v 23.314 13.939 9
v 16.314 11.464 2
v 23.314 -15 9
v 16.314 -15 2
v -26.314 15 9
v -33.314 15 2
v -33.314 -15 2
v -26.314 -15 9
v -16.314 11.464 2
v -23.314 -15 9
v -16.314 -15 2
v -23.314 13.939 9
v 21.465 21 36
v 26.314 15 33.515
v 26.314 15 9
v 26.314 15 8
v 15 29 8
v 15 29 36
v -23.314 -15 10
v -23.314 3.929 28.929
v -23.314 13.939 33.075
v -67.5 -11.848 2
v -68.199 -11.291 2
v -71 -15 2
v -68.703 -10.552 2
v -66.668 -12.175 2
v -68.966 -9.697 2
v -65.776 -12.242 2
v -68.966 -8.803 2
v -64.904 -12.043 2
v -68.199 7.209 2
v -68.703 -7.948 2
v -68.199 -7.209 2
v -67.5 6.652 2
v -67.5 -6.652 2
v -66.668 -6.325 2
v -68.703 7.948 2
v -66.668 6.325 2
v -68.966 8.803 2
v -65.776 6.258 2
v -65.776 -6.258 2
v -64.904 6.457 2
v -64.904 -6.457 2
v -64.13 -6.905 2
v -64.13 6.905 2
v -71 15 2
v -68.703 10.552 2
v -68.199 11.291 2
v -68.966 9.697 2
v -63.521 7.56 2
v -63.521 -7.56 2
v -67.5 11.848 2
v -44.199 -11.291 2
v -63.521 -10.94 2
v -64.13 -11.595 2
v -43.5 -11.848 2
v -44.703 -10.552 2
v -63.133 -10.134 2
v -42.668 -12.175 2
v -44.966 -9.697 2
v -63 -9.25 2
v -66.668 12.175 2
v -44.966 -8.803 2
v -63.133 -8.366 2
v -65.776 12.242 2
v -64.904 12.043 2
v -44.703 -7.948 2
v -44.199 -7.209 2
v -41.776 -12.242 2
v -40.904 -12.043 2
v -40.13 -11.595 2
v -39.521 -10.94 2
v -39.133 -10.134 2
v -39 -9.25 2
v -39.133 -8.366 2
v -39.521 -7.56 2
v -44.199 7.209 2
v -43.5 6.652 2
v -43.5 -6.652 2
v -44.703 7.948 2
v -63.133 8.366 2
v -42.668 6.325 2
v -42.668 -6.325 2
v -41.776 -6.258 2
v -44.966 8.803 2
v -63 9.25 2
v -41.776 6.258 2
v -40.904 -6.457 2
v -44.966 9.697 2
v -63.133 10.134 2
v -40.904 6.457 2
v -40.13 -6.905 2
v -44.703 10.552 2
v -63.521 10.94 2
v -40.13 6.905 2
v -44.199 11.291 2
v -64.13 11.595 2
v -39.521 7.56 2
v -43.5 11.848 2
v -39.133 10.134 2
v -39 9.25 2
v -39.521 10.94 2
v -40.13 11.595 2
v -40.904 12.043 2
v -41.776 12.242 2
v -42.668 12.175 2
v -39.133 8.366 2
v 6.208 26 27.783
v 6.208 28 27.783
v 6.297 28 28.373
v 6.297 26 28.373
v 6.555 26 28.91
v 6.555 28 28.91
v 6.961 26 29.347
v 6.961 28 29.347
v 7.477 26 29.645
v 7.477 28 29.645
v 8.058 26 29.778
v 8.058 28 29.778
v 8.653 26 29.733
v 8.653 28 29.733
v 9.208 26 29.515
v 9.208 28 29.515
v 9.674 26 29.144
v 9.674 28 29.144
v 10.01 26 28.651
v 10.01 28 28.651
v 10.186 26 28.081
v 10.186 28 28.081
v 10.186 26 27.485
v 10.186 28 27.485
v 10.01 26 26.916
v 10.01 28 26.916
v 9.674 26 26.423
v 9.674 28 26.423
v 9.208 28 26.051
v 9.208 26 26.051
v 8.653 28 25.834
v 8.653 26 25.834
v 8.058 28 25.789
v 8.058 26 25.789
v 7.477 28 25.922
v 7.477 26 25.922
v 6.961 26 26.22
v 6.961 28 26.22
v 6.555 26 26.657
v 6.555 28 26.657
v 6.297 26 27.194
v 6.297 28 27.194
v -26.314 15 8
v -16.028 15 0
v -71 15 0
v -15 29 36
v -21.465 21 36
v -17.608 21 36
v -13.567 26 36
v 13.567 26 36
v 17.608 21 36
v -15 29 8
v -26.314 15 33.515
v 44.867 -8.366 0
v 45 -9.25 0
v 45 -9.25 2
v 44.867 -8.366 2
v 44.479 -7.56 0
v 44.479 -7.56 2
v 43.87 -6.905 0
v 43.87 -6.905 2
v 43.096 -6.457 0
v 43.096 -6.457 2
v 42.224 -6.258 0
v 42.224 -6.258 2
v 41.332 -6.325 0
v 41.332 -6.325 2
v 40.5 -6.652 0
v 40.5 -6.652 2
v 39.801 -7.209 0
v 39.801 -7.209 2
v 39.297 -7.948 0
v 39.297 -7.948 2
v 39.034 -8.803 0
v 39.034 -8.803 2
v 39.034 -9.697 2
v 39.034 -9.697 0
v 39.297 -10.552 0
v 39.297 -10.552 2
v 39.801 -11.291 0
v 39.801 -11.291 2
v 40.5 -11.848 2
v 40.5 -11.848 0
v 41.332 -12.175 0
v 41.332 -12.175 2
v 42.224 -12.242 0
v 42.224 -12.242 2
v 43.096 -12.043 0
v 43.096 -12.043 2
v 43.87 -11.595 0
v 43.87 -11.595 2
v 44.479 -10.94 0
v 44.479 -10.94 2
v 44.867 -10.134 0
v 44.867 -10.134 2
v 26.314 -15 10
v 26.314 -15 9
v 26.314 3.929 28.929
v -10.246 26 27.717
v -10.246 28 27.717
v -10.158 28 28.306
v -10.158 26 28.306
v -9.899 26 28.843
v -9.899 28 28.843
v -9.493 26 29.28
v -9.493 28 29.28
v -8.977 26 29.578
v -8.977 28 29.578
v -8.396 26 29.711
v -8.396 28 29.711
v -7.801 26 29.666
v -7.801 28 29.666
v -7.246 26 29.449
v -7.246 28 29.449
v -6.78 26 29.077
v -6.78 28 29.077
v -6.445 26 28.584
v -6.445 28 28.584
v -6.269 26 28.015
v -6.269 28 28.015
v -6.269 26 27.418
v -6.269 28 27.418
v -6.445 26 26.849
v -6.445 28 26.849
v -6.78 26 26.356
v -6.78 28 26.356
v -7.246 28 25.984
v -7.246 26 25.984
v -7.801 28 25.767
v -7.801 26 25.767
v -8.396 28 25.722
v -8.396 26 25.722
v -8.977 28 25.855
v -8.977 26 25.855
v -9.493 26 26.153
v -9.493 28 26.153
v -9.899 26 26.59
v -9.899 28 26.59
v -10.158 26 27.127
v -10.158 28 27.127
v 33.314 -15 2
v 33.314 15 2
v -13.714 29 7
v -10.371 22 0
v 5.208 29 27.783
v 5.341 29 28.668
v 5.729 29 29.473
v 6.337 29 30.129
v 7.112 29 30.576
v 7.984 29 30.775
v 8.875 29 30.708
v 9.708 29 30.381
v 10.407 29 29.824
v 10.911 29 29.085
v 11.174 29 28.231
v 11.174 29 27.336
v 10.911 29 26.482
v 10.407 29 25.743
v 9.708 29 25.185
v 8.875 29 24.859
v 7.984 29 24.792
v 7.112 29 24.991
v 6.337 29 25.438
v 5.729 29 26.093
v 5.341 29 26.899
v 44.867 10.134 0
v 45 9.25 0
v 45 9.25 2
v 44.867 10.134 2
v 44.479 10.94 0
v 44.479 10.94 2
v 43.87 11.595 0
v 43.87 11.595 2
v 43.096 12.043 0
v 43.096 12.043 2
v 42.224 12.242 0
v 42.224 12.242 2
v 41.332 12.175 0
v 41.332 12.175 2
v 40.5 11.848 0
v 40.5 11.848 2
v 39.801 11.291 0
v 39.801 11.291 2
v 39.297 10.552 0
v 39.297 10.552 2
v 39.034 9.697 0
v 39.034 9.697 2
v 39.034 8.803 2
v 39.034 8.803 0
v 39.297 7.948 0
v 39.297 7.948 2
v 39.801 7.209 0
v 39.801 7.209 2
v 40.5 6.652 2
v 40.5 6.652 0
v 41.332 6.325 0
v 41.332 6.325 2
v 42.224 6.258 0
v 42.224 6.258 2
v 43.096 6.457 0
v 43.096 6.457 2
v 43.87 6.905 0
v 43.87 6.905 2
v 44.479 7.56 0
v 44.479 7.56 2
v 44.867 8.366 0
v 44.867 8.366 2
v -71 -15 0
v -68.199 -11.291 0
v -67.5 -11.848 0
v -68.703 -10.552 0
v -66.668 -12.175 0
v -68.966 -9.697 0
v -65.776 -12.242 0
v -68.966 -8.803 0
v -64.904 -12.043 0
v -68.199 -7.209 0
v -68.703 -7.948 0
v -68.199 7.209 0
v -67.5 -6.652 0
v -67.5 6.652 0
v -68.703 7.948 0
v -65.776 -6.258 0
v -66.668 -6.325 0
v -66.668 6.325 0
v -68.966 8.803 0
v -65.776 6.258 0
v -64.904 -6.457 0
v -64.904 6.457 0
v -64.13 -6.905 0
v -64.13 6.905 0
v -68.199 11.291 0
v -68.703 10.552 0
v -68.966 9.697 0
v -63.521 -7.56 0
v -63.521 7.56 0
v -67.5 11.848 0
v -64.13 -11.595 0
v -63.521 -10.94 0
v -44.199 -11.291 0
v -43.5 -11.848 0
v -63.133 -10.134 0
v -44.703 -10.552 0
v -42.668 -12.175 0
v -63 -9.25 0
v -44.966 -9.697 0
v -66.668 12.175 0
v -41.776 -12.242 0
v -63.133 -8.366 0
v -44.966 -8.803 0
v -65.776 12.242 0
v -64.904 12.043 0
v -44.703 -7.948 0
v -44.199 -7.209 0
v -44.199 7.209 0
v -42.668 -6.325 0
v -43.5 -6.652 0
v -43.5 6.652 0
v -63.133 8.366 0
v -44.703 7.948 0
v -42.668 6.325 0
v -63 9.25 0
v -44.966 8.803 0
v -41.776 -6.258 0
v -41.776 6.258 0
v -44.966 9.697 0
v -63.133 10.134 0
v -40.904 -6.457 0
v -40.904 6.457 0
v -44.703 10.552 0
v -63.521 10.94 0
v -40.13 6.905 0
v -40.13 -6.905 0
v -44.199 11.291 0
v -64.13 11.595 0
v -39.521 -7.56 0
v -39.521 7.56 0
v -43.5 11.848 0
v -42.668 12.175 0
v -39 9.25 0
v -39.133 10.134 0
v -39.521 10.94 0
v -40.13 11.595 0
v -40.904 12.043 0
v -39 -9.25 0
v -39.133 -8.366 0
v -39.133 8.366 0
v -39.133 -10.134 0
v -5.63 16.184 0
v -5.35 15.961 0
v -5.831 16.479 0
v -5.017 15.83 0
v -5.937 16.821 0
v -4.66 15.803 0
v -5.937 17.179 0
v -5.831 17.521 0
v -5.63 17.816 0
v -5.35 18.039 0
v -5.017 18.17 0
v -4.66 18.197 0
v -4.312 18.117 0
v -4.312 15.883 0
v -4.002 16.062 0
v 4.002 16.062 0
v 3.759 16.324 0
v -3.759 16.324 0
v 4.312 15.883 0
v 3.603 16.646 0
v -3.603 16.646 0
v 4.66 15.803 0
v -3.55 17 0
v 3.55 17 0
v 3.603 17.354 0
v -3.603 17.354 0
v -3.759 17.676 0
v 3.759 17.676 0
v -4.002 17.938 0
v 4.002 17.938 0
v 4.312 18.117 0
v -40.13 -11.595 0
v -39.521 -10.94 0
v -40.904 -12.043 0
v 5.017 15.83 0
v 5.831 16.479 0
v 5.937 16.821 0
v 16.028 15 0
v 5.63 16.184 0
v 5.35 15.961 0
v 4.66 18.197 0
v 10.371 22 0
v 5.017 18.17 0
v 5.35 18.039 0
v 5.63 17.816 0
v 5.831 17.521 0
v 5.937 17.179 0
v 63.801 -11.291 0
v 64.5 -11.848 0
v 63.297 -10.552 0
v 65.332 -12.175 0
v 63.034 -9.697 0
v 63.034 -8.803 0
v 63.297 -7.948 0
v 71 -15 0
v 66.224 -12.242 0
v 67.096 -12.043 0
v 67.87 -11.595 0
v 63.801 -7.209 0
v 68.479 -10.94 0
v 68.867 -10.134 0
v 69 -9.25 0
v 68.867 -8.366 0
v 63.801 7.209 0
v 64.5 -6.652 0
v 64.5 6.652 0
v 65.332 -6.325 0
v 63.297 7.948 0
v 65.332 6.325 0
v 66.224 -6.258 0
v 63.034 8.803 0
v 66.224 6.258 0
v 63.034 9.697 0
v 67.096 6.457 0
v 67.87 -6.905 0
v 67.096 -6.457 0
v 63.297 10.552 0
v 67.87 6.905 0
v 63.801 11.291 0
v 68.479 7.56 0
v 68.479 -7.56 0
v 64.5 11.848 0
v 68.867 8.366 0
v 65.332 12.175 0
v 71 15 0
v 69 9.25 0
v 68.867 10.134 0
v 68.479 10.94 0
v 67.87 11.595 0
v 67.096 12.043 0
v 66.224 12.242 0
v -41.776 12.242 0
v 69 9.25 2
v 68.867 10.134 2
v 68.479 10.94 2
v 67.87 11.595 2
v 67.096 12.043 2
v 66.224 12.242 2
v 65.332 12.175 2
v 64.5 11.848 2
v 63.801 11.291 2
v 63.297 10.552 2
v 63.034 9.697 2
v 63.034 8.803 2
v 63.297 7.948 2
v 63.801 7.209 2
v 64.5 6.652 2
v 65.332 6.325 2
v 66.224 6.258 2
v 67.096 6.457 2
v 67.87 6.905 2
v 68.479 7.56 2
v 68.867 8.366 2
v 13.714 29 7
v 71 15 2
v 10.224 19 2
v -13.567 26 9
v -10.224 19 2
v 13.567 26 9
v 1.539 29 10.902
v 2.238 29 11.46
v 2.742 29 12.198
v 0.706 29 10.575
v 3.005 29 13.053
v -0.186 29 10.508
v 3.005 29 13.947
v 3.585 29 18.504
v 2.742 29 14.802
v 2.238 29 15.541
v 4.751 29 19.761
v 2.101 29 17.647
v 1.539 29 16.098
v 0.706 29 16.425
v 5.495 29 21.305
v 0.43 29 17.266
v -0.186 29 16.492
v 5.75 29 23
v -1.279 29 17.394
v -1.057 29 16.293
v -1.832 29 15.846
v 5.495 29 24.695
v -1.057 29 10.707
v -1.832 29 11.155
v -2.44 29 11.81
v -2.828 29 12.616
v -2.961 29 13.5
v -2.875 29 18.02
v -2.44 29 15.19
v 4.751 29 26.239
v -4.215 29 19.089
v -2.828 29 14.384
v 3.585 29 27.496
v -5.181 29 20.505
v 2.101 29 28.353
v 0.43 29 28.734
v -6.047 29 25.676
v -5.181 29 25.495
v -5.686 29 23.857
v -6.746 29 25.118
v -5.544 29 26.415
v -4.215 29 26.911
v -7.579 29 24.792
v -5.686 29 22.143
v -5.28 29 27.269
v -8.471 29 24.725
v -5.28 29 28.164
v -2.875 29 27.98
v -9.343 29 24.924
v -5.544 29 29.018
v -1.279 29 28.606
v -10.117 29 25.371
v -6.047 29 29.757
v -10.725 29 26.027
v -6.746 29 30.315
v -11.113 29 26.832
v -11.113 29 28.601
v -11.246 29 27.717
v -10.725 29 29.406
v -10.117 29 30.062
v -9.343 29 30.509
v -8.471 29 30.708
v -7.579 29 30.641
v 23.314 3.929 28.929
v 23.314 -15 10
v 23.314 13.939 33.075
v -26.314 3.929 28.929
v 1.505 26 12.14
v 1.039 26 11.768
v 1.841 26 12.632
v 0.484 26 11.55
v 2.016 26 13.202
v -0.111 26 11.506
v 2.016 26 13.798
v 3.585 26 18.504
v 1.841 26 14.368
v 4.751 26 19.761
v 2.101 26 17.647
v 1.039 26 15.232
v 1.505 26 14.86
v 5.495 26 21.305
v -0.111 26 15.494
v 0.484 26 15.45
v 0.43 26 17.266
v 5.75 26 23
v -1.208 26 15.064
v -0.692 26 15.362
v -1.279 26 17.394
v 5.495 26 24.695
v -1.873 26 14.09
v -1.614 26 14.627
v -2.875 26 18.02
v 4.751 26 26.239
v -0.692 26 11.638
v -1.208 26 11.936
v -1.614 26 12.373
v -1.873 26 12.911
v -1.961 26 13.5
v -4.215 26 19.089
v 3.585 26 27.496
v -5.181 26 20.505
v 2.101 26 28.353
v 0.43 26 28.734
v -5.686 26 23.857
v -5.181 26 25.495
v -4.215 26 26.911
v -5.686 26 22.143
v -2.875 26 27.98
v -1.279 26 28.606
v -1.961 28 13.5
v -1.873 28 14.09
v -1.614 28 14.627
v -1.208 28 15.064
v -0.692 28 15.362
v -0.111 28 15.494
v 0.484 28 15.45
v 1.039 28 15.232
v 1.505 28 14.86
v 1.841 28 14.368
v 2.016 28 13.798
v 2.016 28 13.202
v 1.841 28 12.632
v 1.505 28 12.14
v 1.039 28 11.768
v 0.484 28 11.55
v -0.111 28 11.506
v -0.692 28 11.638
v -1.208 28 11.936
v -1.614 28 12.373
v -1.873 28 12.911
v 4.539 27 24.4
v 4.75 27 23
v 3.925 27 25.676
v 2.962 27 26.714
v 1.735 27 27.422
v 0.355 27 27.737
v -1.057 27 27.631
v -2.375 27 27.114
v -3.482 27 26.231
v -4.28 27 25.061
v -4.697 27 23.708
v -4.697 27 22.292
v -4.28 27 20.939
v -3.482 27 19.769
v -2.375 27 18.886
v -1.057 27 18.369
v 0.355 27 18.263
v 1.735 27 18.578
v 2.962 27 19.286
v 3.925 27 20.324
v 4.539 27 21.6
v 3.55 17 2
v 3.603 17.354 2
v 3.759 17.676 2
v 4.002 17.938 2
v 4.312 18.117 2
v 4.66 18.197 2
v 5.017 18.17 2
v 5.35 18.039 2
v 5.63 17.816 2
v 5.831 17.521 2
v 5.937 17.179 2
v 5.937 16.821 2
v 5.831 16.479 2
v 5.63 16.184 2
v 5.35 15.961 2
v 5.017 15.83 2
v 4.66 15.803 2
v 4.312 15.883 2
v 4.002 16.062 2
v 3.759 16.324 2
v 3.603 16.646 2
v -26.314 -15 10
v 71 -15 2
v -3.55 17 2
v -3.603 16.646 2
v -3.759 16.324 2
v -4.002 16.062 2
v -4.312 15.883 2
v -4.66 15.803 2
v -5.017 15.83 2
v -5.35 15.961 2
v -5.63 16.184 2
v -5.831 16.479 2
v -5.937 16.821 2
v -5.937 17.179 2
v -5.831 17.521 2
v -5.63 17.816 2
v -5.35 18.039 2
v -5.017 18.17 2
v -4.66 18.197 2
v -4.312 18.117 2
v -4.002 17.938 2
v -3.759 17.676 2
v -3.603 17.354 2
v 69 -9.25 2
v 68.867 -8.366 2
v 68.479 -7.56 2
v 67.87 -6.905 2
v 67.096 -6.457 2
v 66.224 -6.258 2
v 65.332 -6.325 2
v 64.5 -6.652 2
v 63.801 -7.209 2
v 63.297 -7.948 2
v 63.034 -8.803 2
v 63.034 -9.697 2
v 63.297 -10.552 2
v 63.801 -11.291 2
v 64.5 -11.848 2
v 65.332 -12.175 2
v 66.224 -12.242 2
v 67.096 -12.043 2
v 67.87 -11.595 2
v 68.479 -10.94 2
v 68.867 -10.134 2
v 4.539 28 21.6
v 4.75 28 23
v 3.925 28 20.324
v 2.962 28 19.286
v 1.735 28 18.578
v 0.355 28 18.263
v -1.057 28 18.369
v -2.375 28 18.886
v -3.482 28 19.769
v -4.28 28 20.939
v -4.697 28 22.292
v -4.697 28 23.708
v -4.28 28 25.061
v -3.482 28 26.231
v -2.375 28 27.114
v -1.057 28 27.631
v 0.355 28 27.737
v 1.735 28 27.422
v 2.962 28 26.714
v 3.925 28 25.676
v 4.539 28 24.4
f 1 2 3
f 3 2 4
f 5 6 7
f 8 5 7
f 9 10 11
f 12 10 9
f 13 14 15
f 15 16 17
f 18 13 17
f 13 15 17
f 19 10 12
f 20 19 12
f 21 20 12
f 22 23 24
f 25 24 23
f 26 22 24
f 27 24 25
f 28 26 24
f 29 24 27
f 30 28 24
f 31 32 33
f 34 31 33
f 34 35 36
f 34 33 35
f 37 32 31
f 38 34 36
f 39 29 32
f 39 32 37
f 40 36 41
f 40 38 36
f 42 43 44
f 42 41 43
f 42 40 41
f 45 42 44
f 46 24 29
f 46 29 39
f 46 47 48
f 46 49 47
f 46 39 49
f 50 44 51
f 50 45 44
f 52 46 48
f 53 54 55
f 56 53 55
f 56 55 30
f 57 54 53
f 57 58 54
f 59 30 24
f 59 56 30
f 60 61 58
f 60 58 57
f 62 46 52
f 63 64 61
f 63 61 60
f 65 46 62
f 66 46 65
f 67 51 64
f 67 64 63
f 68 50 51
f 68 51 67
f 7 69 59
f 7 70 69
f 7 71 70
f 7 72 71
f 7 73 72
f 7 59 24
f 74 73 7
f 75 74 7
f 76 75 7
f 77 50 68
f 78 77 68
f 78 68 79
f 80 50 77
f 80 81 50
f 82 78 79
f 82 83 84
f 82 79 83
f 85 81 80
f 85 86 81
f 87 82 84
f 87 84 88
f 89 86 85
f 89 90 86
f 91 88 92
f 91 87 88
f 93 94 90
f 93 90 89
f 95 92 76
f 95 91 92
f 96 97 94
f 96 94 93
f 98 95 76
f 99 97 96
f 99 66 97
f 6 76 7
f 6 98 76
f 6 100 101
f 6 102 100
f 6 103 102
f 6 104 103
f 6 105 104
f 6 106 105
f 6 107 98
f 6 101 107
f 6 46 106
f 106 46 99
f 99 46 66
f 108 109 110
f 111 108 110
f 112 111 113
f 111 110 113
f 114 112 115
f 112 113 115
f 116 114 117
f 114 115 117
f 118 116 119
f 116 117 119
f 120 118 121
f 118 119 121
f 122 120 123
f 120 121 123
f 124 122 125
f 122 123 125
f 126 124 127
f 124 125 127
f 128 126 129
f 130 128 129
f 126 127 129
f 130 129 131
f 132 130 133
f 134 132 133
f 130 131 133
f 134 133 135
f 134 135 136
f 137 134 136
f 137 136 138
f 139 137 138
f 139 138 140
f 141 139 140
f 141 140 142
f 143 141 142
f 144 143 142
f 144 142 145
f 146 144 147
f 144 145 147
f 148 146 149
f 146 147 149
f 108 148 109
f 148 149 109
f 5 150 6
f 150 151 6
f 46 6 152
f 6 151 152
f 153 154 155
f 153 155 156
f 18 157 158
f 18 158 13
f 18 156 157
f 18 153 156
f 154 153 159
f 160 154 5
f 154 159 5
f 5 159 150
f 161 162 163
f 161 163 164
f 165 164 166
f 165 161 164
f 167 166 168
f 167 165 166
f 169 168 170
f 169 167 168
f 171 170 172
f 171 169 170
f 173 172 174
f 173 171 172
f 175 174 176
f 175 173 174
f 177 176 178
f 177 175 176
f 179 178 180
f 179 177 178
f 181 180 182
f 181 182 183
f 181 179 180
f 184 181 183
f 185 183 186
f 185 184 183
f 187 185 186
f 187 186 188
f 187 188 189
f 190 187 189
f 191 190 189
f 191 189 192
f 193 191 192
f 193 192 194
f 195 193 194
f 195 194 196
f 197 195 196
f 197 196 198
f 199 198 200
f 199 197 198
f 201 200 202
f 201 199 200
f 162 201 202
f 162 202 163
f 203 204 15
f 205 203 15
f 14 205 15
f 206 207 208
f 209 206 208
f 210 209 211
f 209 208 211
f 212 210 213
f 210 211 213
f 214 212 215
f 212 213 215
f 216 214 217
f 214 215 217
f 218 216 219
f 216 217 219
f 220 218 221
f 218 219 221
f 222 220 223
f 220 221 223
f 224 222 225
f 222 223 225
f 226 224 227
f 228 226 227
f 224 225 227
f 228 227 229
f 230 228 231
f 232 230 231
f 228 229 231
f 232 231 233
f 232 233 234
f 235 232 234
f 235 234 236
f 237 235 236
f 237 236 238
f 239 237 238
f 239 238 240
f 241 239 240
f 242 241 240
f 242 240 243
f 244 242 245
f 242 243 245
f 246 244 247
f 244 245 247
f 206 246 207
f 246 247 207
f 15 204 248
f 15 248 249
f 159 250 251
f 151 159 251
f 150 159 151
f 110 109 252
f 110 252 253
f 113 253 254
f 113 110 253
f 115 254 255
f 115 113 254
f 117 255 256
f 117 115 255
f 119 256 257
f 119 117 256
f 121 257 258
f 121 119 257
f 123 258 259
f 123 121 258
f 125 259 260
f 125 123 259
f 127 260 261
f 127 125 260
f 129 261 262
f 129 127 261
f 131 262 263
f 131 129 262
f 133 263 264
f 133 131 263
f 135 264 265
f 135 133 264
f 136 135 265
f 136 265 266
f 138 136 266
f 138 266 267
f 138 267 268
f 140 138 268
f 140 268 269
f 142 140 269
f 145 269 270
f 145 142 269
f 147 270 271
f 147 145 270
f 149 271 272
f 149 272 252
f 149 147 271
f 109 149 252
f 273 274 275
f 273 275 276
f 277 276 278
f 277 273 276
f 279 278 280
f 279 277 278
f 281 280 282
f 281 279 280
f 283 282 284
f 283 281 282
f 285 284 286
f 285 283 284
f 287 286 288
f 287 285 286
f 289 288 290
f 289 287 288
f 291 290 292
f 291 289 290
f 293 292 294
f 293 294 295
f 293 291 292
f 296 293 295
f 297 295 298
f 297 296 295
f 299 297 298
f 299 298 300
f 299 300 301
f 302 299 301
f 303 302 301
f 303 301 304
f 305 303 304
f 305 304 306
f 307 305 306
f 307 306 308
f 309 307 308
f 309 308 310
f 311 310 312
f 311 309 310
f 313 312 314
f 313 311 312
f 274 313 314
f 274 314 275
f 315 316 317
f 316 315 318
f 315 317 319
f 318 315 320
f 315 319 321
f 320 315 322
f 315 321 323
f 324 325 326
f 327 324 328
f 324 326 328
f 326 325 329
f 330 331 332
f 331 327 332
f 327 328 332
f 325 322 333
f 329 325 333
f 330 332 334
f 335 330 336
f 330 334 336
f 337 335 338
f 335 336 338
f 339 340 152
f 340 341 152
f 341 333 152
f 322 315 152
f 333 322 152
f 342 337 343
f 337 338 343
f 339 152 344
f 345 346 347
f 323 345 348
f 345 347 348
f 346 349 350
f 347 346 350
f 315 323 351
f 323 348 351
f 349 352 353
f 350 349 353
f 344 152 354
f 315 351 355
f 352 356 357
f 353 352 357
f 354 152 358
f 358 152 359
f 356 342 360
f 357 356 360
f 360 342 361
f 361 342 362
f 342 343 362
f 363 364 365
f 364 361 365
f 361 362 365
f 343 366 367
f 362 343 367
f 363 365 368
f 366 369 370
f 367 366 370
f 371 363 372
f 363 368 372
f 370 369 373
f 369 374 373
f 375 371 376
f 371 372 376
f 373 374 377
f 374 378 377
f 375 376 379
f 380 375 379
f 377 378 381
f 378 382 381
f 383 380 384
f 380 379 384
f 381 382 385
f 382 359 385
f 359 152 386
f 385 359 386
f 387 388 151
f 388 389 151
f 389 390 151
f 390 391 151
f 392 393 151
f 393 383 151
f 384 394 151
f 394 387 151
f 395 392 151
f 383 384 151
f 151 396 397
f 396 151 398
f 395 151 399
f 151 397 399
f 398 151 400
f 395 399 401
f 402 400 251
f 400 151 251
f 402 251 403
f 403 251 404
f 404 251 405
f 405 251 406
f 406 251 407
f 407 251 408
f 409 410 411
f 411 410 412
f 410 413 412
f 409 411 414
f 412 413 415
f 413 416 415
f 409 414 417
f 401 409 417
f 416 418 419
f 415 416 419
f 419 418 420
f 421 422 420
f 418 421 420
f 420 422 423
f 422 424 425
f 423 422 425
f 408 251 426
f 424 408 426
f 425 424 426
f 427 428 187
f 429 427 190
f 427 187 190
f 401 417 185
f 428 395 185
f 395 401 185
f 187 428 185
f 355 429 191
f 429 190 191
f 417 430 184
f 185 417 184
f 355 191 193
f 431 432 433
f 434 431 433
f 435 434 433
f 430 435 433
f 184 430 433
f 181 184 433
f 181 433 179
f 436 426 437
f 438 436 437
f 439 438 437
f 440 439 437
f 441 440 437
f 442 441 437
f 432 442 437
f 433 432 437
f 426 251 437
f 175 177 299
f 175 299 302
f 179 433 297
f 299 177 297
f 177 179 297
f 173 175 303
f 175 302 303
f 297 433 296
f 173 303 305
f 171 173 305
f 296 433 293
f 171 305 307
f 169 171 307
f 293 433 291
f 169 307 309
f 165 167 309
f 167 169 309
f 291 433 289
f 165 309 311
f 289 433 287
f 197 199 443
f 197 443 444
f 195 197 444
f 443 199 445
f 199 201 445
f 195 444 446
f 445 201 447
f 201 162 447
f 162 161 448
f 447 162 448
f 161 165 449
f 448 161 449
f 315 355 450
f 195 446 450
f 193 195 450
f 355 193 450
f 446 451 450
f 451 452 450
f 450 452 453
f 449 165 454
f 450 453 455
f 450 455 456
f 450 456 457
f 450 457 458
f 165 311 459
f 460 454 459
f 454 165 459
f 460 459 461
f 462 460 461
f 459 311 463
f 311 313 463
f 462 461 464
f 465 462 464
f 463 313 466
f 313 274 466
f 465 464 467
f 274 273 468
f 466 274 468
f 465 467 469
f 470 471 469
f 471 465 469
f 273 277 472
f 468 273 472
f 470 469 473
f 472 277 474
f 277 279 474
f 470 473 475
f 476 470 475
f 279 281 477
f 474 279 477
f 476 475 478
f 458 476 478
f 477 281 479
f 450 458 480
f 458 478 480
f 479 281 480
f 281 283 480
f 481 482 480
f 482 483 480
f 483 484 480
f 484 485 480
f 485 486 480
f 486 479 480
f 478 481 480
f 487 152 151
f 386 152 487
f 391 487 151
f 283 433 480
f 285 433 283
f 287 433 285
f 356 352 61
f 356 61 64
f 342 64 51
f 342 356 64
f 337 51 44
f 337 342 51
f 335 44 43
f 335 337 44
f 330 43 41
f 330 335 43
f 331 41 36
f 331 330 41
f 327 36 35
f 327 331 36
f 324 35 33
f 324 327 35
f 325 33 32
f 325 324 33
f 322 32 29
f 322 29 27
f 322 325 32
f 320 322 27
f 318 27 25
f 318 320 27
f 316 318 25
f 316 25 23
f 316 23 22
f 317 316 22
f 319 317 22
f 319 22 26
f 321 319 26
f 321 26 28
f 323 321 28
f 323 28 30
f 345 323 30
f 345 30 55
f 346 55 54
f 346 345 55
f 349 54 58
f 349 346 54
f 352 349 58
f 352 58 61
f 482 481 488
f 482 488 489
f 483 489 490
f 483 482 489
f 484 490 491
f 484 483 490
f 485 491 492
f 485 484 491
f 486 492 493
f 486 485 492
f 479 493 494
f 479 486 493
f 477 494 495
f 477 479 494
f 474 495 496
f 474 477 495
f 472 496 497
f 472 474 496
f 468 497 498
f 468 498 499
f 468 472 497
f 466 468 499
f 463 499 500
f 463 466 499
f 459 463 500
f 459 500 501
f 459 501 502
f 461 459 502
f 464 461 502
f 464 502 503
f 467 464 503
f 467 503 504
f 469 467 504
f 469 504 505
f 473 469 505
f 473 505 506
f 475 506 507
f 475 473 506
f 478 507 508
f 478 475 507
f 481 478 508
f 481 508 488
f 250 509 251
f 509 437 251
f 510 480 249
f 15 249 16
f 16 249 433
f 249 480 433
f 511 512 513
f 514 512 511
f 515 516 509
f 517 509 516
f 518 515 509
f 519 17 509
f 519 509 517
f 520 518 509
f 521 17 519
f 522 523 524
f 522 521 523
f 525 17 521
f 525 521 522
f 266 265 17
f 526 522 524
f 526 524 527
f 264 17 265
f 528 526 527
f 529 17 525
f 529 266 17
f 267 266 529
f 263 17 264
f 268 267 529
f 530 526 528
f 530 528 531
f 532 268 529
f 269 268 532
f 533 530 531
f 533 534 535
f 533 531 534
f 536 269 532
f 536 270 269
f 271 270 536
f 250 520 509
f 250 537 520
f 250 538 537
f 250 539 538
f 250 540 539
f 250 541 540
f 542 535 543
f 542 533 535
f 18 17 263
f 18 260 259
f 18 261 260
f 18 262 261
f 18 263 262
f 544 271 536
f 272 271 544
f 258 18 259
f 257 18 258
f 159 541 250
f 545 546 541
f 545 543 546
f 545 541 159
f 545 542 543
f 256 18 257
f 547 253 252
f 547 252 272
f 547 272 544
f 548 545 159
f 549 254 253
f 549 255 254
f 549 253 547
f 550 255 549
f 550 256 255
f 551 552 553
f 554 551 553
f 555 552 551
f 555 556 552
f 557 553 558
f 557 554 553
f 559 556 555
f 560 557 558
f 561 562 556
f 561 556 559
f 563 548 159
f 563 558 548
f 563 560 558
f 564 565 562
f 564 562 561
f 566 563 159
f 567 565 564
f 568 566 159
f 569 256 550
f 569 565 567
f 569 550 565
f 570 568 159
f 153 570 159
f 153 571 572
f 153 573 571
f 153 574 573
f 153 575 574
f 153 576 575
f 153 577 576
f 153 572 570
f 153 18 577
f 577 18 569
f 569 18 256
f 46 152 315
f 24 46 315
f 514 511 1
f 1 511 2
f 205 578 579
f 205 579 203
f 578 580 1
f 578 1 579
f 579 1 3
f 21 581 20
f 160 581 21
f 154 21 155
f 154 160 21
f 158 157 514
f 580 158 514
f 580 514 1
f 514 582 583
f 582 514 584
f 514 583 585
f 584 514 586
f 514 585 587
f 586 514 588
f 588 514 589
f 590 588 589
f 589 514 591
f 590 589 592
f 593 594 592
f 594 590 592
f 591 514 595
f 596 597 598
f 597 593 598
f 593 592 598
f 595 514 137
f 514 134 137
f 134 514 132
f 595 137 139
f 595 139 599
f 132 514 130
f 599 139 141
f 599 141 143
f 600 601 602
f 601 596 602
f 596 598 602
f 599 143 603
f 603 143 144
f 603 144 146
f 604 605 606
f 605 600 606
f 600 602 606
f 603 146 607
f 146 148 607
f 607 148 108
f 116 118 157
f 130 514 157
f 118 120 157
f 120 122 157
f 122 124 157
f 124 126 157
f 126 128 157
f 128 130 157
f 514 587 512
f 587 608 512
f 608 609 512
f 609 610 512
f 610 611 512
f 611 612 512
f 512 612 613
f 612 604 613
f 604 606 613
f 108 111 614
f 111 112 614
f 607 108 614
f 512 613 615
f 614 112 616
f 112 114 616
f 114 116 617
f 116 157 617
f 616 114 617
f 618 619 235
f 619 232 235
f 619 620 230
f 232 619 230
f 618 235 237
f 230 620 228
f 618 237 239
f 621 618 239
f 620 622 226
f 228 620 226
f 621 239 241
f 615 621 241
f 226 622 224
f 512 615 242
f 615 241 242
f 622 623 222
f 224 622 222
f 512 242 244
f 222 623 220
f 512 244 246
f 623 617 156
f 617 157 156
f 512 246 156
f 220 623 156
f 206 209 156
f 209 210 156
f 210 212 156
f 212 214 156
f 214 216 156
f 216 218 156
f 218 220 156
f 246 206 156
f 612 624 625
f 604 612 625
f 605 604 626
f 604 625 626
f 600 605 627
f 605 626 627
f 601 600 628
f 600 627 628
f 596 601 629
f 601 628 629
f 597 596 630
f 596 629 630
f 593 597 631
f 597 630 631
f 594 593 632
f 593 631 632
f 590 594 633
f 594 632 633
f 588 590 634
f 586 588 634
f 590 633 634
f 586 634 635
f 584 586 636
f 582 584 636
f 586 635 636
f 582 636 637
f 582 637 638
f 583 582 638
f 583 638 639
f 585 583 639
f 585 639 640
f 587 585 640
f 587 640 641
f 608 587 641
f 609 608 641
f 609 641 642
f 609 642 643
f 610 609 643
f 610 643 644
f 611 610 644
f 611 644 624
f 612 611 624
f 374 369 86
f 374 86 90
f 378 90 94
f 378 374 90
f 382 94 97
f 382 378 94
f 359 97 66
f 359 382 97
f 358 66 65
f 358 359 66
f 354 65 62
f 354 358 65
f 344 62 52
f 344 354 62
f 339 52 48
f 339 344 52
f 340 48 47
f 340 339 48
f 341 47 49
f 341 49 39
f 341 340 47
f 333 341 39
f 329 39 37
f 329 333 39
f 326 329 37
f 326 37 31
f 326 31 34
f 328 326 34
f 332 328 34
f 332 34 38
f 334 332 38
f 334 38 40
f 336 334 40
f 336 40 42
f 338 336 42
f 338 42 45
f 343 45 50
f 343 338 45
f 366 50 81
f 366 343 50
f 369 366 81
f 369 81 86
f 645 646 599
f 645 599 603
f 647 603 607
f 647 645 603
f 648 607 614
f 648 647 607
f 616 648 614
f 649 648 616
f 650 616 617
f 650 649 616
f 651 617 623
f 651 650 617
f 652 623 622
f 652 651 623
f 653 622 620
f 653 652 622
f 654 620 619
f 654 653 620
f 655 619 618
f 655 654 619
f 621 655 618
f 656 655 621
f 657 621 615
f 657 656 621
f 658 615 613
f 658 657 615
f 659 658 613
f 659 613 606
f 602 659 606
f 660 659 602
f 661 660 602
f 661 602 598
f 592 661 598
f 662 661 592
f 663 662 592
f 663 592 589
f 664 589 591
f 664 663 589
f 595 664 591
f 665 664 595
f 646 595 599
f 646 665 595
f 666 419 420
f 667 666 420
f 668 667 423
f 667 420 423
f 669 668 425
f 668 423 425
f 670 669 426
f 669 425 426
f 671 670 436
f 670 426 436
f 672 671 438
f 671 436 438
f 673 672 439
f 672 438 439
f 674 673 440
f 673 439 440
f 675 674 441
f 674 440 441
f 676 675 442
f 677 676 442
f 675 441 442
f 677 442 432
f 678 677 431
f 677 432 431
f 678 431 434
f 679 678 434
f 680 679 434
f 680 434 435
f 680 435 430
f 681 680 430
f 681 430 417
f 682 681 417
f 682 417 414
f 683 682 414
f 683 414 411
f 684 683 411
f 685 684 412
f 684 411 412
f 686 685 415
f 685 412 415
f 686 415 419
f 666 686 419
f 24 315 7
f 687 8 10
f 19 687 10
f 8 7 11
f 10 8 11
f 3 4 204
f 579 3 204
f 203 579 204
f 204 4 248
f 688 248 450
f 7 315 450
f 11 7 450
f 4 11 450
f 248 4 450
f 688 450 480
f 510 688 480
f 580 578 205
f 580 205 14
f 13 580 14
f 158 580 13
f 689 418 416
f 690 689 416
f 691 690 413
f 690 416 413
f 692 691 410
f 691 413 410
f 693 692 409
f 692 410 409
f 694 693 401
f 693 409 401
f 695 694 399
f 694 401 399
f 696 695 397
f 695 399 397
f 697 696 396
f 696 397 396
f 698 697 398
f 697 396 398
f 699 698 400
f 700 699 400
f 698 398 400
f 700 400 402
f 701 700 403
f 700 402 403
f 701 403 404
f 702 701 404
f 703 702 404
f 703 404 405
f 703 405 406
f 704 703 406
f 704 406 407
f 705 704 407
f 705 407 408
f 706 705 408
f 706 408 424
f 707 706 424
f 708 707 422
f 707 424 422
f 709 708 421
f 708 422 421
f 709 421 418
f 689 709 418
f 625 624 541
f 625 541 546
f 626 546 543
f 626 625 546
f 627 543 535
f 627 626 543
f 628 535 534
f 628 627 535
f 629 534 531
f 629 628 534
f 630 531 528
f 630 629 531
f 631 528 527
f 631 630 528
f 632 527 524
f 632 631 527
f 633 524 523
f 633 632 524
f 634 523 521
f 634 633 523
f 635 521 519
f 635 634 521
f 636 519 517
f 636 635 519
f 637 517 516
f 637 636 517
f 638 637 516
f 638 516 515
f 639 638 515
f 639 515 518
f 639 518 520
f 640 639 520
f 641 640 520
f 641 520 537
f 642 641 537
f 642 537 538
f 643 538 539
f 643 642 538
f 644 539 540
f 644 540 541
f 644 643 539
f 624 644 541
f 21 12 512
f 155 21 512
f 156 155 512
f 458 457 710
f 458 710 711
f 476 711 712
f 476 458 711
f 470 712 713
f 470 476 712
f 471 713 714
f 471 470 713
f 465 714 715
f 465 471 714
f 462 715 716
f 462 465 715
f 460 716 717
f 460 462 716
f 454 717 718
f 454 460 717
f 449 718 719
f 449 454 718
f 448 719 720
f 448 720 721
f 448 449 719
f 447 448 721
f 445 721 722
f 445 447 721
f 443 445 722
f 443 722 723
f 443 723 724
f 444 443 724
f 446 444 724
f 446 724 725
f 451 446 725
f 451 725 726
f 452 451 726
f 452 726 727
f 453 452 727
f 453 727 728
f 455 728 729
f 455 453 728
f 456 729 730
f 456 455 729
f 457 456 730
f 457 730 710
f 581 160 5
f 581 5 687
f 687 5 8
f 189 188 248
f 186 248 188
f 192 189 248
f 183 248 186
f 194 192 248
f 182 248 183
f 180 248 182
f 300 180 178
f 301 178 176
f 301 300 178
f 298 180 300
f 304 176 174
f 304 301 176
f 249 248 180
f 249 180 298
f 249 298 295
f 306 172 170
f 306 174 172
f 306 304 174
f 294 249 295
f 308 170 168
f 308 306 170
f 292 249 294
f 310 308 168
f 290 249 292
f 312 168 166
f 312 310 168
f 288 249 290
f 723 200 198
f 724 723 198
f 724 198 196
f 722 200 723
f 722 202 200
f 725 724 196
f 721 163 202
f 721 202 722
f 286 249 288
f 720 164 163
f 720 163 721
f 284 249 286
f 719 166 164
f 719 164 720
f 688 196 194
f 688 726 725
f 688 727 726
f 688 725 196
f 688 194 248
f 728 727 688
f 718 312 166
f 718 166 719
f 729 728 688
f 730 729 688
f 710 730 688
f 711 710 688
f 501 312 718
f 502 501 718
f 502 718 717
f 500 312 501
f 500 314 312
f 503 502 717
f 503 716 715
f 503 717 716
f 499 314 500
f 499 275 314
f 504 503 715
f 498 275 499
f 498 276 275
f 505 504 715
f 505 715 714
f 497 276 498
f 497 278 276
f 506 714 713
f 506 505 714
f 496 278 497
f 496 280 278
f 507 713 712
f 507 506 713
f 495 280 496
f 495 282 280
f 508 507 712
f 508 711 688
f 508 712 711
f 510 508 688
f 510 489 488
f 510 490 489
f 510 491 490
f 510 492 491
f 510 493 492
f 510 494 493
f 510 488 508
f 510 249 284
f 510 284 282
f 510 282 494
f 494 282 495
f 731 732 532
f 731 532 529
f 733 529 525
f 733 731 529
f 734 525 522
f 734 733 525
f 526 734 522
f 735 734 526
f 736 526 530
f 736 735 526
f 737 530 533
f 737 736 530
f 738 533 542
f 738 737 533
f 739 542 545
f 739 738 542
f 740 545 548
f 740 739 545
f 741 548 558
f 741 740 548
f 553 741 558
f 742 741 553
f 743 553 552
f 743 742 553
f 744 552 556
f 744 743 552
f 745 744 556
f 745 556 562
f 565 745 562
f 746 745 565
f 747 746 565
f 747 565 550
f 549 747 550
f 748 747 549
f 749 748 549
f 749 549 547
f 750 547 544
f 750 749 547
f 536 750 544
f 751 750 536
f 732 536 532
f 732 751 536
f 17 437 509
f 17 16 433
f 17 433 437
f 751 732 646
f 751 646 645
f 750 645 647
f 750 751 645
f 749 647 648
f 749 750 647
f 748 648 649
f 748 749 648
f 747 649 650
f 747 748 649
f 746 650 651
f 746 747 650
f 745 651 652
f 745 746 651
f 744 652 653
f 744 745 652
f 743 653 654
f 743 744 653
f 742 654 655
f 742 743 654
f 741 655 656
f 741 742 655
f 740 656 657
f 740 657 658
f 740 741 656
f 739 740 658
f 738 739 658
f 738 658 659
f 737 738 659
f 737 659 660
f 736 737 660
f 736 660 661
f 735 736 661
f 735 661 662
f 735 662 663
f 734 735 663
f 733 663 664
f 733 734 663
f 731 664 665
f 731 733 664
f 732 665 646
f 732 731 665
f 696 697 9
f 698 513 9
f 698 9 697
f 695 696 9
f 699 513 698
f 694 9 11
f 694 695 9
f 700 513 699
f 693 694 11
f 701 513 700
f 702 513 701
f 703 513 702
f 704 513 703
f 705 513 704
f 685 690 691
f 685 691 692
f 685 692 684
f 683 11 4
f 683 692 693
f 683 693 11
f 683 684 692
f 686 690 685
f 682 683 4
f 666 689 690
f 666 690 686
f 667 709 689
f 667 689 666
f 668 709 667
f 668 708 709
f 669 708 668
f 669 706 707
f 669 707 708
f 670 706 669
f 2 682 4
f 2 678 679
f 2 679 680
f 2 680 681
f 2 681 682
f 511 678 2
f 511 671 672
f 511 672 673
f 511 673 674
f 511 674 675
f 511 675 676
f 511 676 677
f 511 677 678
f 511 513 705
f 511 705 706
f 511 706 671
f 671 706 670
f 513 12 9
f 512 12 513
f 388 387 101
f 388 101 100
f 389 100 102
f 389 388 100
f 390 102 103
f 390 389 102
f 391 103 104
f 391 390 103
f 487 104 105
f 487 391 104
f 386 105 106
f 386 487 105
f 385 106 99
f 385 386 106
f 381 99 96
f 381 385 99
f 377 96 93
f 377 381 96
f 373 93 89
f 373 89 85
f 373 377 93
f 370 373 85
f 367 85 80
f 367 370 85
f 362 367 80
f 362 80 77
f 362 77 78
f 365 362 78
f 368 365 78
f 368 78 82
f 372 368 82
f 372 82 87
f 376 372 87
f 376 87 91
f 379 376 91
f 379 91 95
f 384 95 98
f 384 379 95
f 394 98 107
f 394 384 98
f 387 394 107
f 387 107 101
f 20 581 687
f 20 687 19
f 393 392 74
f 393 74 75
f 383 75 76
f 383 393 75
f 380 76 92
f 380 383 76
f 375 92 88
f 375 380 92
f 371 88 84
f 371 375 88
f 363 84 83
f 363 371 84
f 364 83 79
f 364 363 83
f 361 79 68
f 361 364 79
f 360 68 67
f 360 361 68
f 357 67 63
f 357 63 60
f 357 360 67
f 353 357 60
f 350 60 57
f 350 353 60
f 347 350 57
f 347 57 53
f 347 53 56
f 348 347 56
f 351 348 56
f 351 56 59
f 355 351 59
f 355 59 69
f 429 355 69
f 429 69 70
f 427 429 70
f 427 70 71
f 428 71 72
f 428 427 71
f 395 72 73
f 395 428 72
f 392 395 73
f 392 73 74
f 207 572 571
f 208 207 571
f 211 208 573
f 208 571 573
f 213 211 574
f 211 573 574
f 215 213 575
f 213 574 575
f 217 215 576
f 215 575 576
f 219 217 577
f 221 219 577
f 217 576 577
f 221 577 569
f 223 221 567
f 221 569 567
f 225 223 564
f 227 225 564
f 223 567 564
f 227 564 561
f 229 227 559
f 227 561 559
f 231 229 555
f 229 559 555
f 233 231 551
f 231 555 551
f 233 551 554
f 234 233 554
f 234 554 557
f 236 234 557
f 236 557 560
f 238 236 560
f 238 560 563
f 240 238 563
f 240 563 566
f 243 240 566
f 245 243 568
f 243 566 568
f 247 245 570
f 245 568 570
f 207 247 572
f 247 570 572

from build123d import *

# Parameters (mm, degrees)
F0_R         = 3
F1_DEPTH     = 2
F3_DEPTH     = 21
F4_R         = 2
F5_DEPTH     = 3
F6_DEPTH     = 44.001
F7_SIZE      = 7
F8_DEPTH     = 13
F9_SIZE      = 26
F10_T1_DEPTH = 54.8534078581
F10_T3_DEPTH = 54.8534078581
F11_SIZE     = 8
F12_SIZE     = 1
F13_SIZE     = 1
F14_R        = 1.2
F15_DEPTH    = 2


# Not quite as in the source:
# - a fillet or chamfer that OpenCascade refuses, or shapes differently, is made with other operations: its cross-section is extruded or revolved along the edge and cut away or added


with BuildPart() as f1:
    # F0 (on Top) → F1 (new body)
    with BuildSketch(Plane.XY):
        Polygon((-71, -15), (71, -15), (71, 15), (26.313708499, 15), (15, 29), (-15, 29), (-26.313708499, 15), (-71, 15), align=None)
        with Locations((-66, -9.25)):
            Circle(F0_R, mode=Mode.SUBTRACT)
        with Locations((-42, -9.25)):
            Circle(F0_R, mode=Mode.SUBTRACT)
        with Locations((42, -9.25)):
            Circle(F0_R, mode=Mode.SUBTRACT)
        with Locations((66, -9.25)):
            Circle(F0_R, mode=Mode.SUBTRACT)
        with Locations((-66, 9.25)):
            Circle(F0_R, mode=Mode.SUBTRACT)
        with Locations((-42, 9.25)):
            Circle(F0_R, mode=Mode.SUBTRACT)
        with Locations((42, 9.25)):
            Circle(F0_R, mode=Mode.SUBTRACT)
        with Locations((66, 9.25)):
            Circle(F0_R, mode=Mode.SUBTRACT)
    extrude(amount=F1_DEPTH)

    # F2 (on face) → F3 (join)
    with BuildSketch(Plane.XY.offset(2)):
        Polygon((-15, 29), (-26.313708499, 15), (-26.313708499, -15), (-23.313708499, -15), (-23.313708499, 13.9393398282), (-13.5672232498, 26), (13.5672232498, 26), (23.313708499, 13.9393398282), (23.313708499, -15), (26.313708499, -15), (26.313708499, 15), (15, 29), align=None)
    extrude(amount=F3_DEPTH)

    # F4 (on face) → F5 (join)
    with BuildSketch(Plane(origin=(0, 29, 0), x_dir=(-1, 0, 0), z_dir=(0, 1, 0))):
        with BuildLine():
            ThreePointArc((-4.75, 23), (0, 27.75), (4.75, 23))
            Line((4.75, 23), (15, 23))
            Line((15, 23), (15, 36))
            Line((15, 36), (0, 36))
            Line((0, 36), (-15, 36))
            Line((-15, 36), (-15, 23))
            Line((-15, 23), (-4.75, 23))
        make_face()
        with Locations((-8.2078662679, 27.7834016482)):
            Circle(F4_R, mode=Mode.SUBTRACT)
        with Locations((8.2464804778, 27.7165198748)):
            Circle(F4_R, mode=Mode.SUBTRACT)
    extrude(amount=-F5_DEPTH)

    # F4 (on face) → F6 (cut, through all)
    with BuildSketch(Plane(origin=(0, 29, 0), x_dir=(-1, 0, 0), z_dir=(0, 1, 0))):
        with Locations((-8.2078662679, 27.7834016482)):
            Circle(F4_R)
        with BuildLine():
            ThreePointArc((-4.75, 23), (0, 18.25), (4.75, 23))
            Line((4.75, 23), (-4.75, 23))
        make_face()
        with Locations((-0.0386142099, 13.500078477)):
            Circle(F4_R)
    extrude(amount=-F6_DEPTH, mode=Mode.SUBTRACT)

    # F7
    f7_edges = [f1.edges().sort_by_distance(p)[0] for p in [
        (-26.313708, 0, 2),
        (23.313708, -0.53033, 2),
        (18.440466, 19.96967, 2),
        (-18.440466, 19.96967, 2),
        (-23.313708, -0.53033, 2),
        (26.313708, 0, 2),
        (0, 26, 2),
        (0, 29, 0),
    ]]
    chamfer(f7_edges, length=F7_SIZE)

    # F8 (add): faces of the model
    f8_faces = [f1.faces().sort_by_distance(p)[0] for p in [
        (-15.4580909174, 27.5, 23),
        (25.8556175816, 0, 23),
    ]]
    extrude(f8_faces, amount=F8_DEPTH)

    # F9
    f9_edges = [f1.edges().sort_by_distance(p)[0] for p in [
        (-24.813708, -15, 36),
        (24.813708, -15, 36),
    ]]
    chamfer(f9_edges, length=F9_SIZE)

    # F10: chamfer of 10 on 2 edges, made by hand

    # F10_s2 → F10_t1 (cut)
    with BuildSketch(Plane.YZ.offset(-52.2404124281)):
        Polygon((3.9289321881, 28.9289321881), (21, 36), (11, 36), align=None)
    extrude(amount=F10_T1_DEPTH, mode=Mode.SUBTRACT)

    # F10_s4 → F10_t3 (cut)
    with BuildSketch(Plane.YZ.offset(-2.6129954301)):
        Polygon((3.9289321881, 28.9289321881), (21, 36), (11, 36), align=None)
    extrude(amount=F10_T3_DEPTH, mode=Mode.SUBTRACT)

    # F11
    f11_edges = [f1.edges().sort_by_distance(p)[0] for p in [
        (23.485281, 18.5, 0),
        (-23.485281, 18.5, 0),
    ]]
    chamfer(f11_edges, length=F11_SIZE)

    # F12
    f12_edges = [f1.edges().sort_by_distance(p)[0] for p in [
        (2.038614, 29, 13.500078),
        (10.207866, 29, 27.783402),
        (-6.24648, 29, 27.71652),
    ]]
    chamfer(f12_edges, length=F12_SIZE)

    # F13
    f13_edges = [f1.edges().sort_by_distance(p)[0] for p in [
        (-4.75, 26, 23),
        (-4.75, 29, 23),
    ]]
    chamfer(f13_edges, length=F13_SIZE)

    # F14 (on face) → F15 (cut, through all)
    with BuildSketch(Plane(origin=(0, 0, 0), x_dir=(1, 0, 0), z_dir=(0, 0, -1))):
        with Locations((-4.75, -17)):
            Circle(F14_R)
        with BuildLine():
            ThreePointArc((5.95, -17), (4.75, -15.8), (3.55, -17))
            ThreePointArc((3.55, -17), (4.75, -18.2), (5.95, -17))
        make_face()
    extrude(amount=-F15_DEPTH, mode=Mode.SUBTRACT)


solid = f1.part
